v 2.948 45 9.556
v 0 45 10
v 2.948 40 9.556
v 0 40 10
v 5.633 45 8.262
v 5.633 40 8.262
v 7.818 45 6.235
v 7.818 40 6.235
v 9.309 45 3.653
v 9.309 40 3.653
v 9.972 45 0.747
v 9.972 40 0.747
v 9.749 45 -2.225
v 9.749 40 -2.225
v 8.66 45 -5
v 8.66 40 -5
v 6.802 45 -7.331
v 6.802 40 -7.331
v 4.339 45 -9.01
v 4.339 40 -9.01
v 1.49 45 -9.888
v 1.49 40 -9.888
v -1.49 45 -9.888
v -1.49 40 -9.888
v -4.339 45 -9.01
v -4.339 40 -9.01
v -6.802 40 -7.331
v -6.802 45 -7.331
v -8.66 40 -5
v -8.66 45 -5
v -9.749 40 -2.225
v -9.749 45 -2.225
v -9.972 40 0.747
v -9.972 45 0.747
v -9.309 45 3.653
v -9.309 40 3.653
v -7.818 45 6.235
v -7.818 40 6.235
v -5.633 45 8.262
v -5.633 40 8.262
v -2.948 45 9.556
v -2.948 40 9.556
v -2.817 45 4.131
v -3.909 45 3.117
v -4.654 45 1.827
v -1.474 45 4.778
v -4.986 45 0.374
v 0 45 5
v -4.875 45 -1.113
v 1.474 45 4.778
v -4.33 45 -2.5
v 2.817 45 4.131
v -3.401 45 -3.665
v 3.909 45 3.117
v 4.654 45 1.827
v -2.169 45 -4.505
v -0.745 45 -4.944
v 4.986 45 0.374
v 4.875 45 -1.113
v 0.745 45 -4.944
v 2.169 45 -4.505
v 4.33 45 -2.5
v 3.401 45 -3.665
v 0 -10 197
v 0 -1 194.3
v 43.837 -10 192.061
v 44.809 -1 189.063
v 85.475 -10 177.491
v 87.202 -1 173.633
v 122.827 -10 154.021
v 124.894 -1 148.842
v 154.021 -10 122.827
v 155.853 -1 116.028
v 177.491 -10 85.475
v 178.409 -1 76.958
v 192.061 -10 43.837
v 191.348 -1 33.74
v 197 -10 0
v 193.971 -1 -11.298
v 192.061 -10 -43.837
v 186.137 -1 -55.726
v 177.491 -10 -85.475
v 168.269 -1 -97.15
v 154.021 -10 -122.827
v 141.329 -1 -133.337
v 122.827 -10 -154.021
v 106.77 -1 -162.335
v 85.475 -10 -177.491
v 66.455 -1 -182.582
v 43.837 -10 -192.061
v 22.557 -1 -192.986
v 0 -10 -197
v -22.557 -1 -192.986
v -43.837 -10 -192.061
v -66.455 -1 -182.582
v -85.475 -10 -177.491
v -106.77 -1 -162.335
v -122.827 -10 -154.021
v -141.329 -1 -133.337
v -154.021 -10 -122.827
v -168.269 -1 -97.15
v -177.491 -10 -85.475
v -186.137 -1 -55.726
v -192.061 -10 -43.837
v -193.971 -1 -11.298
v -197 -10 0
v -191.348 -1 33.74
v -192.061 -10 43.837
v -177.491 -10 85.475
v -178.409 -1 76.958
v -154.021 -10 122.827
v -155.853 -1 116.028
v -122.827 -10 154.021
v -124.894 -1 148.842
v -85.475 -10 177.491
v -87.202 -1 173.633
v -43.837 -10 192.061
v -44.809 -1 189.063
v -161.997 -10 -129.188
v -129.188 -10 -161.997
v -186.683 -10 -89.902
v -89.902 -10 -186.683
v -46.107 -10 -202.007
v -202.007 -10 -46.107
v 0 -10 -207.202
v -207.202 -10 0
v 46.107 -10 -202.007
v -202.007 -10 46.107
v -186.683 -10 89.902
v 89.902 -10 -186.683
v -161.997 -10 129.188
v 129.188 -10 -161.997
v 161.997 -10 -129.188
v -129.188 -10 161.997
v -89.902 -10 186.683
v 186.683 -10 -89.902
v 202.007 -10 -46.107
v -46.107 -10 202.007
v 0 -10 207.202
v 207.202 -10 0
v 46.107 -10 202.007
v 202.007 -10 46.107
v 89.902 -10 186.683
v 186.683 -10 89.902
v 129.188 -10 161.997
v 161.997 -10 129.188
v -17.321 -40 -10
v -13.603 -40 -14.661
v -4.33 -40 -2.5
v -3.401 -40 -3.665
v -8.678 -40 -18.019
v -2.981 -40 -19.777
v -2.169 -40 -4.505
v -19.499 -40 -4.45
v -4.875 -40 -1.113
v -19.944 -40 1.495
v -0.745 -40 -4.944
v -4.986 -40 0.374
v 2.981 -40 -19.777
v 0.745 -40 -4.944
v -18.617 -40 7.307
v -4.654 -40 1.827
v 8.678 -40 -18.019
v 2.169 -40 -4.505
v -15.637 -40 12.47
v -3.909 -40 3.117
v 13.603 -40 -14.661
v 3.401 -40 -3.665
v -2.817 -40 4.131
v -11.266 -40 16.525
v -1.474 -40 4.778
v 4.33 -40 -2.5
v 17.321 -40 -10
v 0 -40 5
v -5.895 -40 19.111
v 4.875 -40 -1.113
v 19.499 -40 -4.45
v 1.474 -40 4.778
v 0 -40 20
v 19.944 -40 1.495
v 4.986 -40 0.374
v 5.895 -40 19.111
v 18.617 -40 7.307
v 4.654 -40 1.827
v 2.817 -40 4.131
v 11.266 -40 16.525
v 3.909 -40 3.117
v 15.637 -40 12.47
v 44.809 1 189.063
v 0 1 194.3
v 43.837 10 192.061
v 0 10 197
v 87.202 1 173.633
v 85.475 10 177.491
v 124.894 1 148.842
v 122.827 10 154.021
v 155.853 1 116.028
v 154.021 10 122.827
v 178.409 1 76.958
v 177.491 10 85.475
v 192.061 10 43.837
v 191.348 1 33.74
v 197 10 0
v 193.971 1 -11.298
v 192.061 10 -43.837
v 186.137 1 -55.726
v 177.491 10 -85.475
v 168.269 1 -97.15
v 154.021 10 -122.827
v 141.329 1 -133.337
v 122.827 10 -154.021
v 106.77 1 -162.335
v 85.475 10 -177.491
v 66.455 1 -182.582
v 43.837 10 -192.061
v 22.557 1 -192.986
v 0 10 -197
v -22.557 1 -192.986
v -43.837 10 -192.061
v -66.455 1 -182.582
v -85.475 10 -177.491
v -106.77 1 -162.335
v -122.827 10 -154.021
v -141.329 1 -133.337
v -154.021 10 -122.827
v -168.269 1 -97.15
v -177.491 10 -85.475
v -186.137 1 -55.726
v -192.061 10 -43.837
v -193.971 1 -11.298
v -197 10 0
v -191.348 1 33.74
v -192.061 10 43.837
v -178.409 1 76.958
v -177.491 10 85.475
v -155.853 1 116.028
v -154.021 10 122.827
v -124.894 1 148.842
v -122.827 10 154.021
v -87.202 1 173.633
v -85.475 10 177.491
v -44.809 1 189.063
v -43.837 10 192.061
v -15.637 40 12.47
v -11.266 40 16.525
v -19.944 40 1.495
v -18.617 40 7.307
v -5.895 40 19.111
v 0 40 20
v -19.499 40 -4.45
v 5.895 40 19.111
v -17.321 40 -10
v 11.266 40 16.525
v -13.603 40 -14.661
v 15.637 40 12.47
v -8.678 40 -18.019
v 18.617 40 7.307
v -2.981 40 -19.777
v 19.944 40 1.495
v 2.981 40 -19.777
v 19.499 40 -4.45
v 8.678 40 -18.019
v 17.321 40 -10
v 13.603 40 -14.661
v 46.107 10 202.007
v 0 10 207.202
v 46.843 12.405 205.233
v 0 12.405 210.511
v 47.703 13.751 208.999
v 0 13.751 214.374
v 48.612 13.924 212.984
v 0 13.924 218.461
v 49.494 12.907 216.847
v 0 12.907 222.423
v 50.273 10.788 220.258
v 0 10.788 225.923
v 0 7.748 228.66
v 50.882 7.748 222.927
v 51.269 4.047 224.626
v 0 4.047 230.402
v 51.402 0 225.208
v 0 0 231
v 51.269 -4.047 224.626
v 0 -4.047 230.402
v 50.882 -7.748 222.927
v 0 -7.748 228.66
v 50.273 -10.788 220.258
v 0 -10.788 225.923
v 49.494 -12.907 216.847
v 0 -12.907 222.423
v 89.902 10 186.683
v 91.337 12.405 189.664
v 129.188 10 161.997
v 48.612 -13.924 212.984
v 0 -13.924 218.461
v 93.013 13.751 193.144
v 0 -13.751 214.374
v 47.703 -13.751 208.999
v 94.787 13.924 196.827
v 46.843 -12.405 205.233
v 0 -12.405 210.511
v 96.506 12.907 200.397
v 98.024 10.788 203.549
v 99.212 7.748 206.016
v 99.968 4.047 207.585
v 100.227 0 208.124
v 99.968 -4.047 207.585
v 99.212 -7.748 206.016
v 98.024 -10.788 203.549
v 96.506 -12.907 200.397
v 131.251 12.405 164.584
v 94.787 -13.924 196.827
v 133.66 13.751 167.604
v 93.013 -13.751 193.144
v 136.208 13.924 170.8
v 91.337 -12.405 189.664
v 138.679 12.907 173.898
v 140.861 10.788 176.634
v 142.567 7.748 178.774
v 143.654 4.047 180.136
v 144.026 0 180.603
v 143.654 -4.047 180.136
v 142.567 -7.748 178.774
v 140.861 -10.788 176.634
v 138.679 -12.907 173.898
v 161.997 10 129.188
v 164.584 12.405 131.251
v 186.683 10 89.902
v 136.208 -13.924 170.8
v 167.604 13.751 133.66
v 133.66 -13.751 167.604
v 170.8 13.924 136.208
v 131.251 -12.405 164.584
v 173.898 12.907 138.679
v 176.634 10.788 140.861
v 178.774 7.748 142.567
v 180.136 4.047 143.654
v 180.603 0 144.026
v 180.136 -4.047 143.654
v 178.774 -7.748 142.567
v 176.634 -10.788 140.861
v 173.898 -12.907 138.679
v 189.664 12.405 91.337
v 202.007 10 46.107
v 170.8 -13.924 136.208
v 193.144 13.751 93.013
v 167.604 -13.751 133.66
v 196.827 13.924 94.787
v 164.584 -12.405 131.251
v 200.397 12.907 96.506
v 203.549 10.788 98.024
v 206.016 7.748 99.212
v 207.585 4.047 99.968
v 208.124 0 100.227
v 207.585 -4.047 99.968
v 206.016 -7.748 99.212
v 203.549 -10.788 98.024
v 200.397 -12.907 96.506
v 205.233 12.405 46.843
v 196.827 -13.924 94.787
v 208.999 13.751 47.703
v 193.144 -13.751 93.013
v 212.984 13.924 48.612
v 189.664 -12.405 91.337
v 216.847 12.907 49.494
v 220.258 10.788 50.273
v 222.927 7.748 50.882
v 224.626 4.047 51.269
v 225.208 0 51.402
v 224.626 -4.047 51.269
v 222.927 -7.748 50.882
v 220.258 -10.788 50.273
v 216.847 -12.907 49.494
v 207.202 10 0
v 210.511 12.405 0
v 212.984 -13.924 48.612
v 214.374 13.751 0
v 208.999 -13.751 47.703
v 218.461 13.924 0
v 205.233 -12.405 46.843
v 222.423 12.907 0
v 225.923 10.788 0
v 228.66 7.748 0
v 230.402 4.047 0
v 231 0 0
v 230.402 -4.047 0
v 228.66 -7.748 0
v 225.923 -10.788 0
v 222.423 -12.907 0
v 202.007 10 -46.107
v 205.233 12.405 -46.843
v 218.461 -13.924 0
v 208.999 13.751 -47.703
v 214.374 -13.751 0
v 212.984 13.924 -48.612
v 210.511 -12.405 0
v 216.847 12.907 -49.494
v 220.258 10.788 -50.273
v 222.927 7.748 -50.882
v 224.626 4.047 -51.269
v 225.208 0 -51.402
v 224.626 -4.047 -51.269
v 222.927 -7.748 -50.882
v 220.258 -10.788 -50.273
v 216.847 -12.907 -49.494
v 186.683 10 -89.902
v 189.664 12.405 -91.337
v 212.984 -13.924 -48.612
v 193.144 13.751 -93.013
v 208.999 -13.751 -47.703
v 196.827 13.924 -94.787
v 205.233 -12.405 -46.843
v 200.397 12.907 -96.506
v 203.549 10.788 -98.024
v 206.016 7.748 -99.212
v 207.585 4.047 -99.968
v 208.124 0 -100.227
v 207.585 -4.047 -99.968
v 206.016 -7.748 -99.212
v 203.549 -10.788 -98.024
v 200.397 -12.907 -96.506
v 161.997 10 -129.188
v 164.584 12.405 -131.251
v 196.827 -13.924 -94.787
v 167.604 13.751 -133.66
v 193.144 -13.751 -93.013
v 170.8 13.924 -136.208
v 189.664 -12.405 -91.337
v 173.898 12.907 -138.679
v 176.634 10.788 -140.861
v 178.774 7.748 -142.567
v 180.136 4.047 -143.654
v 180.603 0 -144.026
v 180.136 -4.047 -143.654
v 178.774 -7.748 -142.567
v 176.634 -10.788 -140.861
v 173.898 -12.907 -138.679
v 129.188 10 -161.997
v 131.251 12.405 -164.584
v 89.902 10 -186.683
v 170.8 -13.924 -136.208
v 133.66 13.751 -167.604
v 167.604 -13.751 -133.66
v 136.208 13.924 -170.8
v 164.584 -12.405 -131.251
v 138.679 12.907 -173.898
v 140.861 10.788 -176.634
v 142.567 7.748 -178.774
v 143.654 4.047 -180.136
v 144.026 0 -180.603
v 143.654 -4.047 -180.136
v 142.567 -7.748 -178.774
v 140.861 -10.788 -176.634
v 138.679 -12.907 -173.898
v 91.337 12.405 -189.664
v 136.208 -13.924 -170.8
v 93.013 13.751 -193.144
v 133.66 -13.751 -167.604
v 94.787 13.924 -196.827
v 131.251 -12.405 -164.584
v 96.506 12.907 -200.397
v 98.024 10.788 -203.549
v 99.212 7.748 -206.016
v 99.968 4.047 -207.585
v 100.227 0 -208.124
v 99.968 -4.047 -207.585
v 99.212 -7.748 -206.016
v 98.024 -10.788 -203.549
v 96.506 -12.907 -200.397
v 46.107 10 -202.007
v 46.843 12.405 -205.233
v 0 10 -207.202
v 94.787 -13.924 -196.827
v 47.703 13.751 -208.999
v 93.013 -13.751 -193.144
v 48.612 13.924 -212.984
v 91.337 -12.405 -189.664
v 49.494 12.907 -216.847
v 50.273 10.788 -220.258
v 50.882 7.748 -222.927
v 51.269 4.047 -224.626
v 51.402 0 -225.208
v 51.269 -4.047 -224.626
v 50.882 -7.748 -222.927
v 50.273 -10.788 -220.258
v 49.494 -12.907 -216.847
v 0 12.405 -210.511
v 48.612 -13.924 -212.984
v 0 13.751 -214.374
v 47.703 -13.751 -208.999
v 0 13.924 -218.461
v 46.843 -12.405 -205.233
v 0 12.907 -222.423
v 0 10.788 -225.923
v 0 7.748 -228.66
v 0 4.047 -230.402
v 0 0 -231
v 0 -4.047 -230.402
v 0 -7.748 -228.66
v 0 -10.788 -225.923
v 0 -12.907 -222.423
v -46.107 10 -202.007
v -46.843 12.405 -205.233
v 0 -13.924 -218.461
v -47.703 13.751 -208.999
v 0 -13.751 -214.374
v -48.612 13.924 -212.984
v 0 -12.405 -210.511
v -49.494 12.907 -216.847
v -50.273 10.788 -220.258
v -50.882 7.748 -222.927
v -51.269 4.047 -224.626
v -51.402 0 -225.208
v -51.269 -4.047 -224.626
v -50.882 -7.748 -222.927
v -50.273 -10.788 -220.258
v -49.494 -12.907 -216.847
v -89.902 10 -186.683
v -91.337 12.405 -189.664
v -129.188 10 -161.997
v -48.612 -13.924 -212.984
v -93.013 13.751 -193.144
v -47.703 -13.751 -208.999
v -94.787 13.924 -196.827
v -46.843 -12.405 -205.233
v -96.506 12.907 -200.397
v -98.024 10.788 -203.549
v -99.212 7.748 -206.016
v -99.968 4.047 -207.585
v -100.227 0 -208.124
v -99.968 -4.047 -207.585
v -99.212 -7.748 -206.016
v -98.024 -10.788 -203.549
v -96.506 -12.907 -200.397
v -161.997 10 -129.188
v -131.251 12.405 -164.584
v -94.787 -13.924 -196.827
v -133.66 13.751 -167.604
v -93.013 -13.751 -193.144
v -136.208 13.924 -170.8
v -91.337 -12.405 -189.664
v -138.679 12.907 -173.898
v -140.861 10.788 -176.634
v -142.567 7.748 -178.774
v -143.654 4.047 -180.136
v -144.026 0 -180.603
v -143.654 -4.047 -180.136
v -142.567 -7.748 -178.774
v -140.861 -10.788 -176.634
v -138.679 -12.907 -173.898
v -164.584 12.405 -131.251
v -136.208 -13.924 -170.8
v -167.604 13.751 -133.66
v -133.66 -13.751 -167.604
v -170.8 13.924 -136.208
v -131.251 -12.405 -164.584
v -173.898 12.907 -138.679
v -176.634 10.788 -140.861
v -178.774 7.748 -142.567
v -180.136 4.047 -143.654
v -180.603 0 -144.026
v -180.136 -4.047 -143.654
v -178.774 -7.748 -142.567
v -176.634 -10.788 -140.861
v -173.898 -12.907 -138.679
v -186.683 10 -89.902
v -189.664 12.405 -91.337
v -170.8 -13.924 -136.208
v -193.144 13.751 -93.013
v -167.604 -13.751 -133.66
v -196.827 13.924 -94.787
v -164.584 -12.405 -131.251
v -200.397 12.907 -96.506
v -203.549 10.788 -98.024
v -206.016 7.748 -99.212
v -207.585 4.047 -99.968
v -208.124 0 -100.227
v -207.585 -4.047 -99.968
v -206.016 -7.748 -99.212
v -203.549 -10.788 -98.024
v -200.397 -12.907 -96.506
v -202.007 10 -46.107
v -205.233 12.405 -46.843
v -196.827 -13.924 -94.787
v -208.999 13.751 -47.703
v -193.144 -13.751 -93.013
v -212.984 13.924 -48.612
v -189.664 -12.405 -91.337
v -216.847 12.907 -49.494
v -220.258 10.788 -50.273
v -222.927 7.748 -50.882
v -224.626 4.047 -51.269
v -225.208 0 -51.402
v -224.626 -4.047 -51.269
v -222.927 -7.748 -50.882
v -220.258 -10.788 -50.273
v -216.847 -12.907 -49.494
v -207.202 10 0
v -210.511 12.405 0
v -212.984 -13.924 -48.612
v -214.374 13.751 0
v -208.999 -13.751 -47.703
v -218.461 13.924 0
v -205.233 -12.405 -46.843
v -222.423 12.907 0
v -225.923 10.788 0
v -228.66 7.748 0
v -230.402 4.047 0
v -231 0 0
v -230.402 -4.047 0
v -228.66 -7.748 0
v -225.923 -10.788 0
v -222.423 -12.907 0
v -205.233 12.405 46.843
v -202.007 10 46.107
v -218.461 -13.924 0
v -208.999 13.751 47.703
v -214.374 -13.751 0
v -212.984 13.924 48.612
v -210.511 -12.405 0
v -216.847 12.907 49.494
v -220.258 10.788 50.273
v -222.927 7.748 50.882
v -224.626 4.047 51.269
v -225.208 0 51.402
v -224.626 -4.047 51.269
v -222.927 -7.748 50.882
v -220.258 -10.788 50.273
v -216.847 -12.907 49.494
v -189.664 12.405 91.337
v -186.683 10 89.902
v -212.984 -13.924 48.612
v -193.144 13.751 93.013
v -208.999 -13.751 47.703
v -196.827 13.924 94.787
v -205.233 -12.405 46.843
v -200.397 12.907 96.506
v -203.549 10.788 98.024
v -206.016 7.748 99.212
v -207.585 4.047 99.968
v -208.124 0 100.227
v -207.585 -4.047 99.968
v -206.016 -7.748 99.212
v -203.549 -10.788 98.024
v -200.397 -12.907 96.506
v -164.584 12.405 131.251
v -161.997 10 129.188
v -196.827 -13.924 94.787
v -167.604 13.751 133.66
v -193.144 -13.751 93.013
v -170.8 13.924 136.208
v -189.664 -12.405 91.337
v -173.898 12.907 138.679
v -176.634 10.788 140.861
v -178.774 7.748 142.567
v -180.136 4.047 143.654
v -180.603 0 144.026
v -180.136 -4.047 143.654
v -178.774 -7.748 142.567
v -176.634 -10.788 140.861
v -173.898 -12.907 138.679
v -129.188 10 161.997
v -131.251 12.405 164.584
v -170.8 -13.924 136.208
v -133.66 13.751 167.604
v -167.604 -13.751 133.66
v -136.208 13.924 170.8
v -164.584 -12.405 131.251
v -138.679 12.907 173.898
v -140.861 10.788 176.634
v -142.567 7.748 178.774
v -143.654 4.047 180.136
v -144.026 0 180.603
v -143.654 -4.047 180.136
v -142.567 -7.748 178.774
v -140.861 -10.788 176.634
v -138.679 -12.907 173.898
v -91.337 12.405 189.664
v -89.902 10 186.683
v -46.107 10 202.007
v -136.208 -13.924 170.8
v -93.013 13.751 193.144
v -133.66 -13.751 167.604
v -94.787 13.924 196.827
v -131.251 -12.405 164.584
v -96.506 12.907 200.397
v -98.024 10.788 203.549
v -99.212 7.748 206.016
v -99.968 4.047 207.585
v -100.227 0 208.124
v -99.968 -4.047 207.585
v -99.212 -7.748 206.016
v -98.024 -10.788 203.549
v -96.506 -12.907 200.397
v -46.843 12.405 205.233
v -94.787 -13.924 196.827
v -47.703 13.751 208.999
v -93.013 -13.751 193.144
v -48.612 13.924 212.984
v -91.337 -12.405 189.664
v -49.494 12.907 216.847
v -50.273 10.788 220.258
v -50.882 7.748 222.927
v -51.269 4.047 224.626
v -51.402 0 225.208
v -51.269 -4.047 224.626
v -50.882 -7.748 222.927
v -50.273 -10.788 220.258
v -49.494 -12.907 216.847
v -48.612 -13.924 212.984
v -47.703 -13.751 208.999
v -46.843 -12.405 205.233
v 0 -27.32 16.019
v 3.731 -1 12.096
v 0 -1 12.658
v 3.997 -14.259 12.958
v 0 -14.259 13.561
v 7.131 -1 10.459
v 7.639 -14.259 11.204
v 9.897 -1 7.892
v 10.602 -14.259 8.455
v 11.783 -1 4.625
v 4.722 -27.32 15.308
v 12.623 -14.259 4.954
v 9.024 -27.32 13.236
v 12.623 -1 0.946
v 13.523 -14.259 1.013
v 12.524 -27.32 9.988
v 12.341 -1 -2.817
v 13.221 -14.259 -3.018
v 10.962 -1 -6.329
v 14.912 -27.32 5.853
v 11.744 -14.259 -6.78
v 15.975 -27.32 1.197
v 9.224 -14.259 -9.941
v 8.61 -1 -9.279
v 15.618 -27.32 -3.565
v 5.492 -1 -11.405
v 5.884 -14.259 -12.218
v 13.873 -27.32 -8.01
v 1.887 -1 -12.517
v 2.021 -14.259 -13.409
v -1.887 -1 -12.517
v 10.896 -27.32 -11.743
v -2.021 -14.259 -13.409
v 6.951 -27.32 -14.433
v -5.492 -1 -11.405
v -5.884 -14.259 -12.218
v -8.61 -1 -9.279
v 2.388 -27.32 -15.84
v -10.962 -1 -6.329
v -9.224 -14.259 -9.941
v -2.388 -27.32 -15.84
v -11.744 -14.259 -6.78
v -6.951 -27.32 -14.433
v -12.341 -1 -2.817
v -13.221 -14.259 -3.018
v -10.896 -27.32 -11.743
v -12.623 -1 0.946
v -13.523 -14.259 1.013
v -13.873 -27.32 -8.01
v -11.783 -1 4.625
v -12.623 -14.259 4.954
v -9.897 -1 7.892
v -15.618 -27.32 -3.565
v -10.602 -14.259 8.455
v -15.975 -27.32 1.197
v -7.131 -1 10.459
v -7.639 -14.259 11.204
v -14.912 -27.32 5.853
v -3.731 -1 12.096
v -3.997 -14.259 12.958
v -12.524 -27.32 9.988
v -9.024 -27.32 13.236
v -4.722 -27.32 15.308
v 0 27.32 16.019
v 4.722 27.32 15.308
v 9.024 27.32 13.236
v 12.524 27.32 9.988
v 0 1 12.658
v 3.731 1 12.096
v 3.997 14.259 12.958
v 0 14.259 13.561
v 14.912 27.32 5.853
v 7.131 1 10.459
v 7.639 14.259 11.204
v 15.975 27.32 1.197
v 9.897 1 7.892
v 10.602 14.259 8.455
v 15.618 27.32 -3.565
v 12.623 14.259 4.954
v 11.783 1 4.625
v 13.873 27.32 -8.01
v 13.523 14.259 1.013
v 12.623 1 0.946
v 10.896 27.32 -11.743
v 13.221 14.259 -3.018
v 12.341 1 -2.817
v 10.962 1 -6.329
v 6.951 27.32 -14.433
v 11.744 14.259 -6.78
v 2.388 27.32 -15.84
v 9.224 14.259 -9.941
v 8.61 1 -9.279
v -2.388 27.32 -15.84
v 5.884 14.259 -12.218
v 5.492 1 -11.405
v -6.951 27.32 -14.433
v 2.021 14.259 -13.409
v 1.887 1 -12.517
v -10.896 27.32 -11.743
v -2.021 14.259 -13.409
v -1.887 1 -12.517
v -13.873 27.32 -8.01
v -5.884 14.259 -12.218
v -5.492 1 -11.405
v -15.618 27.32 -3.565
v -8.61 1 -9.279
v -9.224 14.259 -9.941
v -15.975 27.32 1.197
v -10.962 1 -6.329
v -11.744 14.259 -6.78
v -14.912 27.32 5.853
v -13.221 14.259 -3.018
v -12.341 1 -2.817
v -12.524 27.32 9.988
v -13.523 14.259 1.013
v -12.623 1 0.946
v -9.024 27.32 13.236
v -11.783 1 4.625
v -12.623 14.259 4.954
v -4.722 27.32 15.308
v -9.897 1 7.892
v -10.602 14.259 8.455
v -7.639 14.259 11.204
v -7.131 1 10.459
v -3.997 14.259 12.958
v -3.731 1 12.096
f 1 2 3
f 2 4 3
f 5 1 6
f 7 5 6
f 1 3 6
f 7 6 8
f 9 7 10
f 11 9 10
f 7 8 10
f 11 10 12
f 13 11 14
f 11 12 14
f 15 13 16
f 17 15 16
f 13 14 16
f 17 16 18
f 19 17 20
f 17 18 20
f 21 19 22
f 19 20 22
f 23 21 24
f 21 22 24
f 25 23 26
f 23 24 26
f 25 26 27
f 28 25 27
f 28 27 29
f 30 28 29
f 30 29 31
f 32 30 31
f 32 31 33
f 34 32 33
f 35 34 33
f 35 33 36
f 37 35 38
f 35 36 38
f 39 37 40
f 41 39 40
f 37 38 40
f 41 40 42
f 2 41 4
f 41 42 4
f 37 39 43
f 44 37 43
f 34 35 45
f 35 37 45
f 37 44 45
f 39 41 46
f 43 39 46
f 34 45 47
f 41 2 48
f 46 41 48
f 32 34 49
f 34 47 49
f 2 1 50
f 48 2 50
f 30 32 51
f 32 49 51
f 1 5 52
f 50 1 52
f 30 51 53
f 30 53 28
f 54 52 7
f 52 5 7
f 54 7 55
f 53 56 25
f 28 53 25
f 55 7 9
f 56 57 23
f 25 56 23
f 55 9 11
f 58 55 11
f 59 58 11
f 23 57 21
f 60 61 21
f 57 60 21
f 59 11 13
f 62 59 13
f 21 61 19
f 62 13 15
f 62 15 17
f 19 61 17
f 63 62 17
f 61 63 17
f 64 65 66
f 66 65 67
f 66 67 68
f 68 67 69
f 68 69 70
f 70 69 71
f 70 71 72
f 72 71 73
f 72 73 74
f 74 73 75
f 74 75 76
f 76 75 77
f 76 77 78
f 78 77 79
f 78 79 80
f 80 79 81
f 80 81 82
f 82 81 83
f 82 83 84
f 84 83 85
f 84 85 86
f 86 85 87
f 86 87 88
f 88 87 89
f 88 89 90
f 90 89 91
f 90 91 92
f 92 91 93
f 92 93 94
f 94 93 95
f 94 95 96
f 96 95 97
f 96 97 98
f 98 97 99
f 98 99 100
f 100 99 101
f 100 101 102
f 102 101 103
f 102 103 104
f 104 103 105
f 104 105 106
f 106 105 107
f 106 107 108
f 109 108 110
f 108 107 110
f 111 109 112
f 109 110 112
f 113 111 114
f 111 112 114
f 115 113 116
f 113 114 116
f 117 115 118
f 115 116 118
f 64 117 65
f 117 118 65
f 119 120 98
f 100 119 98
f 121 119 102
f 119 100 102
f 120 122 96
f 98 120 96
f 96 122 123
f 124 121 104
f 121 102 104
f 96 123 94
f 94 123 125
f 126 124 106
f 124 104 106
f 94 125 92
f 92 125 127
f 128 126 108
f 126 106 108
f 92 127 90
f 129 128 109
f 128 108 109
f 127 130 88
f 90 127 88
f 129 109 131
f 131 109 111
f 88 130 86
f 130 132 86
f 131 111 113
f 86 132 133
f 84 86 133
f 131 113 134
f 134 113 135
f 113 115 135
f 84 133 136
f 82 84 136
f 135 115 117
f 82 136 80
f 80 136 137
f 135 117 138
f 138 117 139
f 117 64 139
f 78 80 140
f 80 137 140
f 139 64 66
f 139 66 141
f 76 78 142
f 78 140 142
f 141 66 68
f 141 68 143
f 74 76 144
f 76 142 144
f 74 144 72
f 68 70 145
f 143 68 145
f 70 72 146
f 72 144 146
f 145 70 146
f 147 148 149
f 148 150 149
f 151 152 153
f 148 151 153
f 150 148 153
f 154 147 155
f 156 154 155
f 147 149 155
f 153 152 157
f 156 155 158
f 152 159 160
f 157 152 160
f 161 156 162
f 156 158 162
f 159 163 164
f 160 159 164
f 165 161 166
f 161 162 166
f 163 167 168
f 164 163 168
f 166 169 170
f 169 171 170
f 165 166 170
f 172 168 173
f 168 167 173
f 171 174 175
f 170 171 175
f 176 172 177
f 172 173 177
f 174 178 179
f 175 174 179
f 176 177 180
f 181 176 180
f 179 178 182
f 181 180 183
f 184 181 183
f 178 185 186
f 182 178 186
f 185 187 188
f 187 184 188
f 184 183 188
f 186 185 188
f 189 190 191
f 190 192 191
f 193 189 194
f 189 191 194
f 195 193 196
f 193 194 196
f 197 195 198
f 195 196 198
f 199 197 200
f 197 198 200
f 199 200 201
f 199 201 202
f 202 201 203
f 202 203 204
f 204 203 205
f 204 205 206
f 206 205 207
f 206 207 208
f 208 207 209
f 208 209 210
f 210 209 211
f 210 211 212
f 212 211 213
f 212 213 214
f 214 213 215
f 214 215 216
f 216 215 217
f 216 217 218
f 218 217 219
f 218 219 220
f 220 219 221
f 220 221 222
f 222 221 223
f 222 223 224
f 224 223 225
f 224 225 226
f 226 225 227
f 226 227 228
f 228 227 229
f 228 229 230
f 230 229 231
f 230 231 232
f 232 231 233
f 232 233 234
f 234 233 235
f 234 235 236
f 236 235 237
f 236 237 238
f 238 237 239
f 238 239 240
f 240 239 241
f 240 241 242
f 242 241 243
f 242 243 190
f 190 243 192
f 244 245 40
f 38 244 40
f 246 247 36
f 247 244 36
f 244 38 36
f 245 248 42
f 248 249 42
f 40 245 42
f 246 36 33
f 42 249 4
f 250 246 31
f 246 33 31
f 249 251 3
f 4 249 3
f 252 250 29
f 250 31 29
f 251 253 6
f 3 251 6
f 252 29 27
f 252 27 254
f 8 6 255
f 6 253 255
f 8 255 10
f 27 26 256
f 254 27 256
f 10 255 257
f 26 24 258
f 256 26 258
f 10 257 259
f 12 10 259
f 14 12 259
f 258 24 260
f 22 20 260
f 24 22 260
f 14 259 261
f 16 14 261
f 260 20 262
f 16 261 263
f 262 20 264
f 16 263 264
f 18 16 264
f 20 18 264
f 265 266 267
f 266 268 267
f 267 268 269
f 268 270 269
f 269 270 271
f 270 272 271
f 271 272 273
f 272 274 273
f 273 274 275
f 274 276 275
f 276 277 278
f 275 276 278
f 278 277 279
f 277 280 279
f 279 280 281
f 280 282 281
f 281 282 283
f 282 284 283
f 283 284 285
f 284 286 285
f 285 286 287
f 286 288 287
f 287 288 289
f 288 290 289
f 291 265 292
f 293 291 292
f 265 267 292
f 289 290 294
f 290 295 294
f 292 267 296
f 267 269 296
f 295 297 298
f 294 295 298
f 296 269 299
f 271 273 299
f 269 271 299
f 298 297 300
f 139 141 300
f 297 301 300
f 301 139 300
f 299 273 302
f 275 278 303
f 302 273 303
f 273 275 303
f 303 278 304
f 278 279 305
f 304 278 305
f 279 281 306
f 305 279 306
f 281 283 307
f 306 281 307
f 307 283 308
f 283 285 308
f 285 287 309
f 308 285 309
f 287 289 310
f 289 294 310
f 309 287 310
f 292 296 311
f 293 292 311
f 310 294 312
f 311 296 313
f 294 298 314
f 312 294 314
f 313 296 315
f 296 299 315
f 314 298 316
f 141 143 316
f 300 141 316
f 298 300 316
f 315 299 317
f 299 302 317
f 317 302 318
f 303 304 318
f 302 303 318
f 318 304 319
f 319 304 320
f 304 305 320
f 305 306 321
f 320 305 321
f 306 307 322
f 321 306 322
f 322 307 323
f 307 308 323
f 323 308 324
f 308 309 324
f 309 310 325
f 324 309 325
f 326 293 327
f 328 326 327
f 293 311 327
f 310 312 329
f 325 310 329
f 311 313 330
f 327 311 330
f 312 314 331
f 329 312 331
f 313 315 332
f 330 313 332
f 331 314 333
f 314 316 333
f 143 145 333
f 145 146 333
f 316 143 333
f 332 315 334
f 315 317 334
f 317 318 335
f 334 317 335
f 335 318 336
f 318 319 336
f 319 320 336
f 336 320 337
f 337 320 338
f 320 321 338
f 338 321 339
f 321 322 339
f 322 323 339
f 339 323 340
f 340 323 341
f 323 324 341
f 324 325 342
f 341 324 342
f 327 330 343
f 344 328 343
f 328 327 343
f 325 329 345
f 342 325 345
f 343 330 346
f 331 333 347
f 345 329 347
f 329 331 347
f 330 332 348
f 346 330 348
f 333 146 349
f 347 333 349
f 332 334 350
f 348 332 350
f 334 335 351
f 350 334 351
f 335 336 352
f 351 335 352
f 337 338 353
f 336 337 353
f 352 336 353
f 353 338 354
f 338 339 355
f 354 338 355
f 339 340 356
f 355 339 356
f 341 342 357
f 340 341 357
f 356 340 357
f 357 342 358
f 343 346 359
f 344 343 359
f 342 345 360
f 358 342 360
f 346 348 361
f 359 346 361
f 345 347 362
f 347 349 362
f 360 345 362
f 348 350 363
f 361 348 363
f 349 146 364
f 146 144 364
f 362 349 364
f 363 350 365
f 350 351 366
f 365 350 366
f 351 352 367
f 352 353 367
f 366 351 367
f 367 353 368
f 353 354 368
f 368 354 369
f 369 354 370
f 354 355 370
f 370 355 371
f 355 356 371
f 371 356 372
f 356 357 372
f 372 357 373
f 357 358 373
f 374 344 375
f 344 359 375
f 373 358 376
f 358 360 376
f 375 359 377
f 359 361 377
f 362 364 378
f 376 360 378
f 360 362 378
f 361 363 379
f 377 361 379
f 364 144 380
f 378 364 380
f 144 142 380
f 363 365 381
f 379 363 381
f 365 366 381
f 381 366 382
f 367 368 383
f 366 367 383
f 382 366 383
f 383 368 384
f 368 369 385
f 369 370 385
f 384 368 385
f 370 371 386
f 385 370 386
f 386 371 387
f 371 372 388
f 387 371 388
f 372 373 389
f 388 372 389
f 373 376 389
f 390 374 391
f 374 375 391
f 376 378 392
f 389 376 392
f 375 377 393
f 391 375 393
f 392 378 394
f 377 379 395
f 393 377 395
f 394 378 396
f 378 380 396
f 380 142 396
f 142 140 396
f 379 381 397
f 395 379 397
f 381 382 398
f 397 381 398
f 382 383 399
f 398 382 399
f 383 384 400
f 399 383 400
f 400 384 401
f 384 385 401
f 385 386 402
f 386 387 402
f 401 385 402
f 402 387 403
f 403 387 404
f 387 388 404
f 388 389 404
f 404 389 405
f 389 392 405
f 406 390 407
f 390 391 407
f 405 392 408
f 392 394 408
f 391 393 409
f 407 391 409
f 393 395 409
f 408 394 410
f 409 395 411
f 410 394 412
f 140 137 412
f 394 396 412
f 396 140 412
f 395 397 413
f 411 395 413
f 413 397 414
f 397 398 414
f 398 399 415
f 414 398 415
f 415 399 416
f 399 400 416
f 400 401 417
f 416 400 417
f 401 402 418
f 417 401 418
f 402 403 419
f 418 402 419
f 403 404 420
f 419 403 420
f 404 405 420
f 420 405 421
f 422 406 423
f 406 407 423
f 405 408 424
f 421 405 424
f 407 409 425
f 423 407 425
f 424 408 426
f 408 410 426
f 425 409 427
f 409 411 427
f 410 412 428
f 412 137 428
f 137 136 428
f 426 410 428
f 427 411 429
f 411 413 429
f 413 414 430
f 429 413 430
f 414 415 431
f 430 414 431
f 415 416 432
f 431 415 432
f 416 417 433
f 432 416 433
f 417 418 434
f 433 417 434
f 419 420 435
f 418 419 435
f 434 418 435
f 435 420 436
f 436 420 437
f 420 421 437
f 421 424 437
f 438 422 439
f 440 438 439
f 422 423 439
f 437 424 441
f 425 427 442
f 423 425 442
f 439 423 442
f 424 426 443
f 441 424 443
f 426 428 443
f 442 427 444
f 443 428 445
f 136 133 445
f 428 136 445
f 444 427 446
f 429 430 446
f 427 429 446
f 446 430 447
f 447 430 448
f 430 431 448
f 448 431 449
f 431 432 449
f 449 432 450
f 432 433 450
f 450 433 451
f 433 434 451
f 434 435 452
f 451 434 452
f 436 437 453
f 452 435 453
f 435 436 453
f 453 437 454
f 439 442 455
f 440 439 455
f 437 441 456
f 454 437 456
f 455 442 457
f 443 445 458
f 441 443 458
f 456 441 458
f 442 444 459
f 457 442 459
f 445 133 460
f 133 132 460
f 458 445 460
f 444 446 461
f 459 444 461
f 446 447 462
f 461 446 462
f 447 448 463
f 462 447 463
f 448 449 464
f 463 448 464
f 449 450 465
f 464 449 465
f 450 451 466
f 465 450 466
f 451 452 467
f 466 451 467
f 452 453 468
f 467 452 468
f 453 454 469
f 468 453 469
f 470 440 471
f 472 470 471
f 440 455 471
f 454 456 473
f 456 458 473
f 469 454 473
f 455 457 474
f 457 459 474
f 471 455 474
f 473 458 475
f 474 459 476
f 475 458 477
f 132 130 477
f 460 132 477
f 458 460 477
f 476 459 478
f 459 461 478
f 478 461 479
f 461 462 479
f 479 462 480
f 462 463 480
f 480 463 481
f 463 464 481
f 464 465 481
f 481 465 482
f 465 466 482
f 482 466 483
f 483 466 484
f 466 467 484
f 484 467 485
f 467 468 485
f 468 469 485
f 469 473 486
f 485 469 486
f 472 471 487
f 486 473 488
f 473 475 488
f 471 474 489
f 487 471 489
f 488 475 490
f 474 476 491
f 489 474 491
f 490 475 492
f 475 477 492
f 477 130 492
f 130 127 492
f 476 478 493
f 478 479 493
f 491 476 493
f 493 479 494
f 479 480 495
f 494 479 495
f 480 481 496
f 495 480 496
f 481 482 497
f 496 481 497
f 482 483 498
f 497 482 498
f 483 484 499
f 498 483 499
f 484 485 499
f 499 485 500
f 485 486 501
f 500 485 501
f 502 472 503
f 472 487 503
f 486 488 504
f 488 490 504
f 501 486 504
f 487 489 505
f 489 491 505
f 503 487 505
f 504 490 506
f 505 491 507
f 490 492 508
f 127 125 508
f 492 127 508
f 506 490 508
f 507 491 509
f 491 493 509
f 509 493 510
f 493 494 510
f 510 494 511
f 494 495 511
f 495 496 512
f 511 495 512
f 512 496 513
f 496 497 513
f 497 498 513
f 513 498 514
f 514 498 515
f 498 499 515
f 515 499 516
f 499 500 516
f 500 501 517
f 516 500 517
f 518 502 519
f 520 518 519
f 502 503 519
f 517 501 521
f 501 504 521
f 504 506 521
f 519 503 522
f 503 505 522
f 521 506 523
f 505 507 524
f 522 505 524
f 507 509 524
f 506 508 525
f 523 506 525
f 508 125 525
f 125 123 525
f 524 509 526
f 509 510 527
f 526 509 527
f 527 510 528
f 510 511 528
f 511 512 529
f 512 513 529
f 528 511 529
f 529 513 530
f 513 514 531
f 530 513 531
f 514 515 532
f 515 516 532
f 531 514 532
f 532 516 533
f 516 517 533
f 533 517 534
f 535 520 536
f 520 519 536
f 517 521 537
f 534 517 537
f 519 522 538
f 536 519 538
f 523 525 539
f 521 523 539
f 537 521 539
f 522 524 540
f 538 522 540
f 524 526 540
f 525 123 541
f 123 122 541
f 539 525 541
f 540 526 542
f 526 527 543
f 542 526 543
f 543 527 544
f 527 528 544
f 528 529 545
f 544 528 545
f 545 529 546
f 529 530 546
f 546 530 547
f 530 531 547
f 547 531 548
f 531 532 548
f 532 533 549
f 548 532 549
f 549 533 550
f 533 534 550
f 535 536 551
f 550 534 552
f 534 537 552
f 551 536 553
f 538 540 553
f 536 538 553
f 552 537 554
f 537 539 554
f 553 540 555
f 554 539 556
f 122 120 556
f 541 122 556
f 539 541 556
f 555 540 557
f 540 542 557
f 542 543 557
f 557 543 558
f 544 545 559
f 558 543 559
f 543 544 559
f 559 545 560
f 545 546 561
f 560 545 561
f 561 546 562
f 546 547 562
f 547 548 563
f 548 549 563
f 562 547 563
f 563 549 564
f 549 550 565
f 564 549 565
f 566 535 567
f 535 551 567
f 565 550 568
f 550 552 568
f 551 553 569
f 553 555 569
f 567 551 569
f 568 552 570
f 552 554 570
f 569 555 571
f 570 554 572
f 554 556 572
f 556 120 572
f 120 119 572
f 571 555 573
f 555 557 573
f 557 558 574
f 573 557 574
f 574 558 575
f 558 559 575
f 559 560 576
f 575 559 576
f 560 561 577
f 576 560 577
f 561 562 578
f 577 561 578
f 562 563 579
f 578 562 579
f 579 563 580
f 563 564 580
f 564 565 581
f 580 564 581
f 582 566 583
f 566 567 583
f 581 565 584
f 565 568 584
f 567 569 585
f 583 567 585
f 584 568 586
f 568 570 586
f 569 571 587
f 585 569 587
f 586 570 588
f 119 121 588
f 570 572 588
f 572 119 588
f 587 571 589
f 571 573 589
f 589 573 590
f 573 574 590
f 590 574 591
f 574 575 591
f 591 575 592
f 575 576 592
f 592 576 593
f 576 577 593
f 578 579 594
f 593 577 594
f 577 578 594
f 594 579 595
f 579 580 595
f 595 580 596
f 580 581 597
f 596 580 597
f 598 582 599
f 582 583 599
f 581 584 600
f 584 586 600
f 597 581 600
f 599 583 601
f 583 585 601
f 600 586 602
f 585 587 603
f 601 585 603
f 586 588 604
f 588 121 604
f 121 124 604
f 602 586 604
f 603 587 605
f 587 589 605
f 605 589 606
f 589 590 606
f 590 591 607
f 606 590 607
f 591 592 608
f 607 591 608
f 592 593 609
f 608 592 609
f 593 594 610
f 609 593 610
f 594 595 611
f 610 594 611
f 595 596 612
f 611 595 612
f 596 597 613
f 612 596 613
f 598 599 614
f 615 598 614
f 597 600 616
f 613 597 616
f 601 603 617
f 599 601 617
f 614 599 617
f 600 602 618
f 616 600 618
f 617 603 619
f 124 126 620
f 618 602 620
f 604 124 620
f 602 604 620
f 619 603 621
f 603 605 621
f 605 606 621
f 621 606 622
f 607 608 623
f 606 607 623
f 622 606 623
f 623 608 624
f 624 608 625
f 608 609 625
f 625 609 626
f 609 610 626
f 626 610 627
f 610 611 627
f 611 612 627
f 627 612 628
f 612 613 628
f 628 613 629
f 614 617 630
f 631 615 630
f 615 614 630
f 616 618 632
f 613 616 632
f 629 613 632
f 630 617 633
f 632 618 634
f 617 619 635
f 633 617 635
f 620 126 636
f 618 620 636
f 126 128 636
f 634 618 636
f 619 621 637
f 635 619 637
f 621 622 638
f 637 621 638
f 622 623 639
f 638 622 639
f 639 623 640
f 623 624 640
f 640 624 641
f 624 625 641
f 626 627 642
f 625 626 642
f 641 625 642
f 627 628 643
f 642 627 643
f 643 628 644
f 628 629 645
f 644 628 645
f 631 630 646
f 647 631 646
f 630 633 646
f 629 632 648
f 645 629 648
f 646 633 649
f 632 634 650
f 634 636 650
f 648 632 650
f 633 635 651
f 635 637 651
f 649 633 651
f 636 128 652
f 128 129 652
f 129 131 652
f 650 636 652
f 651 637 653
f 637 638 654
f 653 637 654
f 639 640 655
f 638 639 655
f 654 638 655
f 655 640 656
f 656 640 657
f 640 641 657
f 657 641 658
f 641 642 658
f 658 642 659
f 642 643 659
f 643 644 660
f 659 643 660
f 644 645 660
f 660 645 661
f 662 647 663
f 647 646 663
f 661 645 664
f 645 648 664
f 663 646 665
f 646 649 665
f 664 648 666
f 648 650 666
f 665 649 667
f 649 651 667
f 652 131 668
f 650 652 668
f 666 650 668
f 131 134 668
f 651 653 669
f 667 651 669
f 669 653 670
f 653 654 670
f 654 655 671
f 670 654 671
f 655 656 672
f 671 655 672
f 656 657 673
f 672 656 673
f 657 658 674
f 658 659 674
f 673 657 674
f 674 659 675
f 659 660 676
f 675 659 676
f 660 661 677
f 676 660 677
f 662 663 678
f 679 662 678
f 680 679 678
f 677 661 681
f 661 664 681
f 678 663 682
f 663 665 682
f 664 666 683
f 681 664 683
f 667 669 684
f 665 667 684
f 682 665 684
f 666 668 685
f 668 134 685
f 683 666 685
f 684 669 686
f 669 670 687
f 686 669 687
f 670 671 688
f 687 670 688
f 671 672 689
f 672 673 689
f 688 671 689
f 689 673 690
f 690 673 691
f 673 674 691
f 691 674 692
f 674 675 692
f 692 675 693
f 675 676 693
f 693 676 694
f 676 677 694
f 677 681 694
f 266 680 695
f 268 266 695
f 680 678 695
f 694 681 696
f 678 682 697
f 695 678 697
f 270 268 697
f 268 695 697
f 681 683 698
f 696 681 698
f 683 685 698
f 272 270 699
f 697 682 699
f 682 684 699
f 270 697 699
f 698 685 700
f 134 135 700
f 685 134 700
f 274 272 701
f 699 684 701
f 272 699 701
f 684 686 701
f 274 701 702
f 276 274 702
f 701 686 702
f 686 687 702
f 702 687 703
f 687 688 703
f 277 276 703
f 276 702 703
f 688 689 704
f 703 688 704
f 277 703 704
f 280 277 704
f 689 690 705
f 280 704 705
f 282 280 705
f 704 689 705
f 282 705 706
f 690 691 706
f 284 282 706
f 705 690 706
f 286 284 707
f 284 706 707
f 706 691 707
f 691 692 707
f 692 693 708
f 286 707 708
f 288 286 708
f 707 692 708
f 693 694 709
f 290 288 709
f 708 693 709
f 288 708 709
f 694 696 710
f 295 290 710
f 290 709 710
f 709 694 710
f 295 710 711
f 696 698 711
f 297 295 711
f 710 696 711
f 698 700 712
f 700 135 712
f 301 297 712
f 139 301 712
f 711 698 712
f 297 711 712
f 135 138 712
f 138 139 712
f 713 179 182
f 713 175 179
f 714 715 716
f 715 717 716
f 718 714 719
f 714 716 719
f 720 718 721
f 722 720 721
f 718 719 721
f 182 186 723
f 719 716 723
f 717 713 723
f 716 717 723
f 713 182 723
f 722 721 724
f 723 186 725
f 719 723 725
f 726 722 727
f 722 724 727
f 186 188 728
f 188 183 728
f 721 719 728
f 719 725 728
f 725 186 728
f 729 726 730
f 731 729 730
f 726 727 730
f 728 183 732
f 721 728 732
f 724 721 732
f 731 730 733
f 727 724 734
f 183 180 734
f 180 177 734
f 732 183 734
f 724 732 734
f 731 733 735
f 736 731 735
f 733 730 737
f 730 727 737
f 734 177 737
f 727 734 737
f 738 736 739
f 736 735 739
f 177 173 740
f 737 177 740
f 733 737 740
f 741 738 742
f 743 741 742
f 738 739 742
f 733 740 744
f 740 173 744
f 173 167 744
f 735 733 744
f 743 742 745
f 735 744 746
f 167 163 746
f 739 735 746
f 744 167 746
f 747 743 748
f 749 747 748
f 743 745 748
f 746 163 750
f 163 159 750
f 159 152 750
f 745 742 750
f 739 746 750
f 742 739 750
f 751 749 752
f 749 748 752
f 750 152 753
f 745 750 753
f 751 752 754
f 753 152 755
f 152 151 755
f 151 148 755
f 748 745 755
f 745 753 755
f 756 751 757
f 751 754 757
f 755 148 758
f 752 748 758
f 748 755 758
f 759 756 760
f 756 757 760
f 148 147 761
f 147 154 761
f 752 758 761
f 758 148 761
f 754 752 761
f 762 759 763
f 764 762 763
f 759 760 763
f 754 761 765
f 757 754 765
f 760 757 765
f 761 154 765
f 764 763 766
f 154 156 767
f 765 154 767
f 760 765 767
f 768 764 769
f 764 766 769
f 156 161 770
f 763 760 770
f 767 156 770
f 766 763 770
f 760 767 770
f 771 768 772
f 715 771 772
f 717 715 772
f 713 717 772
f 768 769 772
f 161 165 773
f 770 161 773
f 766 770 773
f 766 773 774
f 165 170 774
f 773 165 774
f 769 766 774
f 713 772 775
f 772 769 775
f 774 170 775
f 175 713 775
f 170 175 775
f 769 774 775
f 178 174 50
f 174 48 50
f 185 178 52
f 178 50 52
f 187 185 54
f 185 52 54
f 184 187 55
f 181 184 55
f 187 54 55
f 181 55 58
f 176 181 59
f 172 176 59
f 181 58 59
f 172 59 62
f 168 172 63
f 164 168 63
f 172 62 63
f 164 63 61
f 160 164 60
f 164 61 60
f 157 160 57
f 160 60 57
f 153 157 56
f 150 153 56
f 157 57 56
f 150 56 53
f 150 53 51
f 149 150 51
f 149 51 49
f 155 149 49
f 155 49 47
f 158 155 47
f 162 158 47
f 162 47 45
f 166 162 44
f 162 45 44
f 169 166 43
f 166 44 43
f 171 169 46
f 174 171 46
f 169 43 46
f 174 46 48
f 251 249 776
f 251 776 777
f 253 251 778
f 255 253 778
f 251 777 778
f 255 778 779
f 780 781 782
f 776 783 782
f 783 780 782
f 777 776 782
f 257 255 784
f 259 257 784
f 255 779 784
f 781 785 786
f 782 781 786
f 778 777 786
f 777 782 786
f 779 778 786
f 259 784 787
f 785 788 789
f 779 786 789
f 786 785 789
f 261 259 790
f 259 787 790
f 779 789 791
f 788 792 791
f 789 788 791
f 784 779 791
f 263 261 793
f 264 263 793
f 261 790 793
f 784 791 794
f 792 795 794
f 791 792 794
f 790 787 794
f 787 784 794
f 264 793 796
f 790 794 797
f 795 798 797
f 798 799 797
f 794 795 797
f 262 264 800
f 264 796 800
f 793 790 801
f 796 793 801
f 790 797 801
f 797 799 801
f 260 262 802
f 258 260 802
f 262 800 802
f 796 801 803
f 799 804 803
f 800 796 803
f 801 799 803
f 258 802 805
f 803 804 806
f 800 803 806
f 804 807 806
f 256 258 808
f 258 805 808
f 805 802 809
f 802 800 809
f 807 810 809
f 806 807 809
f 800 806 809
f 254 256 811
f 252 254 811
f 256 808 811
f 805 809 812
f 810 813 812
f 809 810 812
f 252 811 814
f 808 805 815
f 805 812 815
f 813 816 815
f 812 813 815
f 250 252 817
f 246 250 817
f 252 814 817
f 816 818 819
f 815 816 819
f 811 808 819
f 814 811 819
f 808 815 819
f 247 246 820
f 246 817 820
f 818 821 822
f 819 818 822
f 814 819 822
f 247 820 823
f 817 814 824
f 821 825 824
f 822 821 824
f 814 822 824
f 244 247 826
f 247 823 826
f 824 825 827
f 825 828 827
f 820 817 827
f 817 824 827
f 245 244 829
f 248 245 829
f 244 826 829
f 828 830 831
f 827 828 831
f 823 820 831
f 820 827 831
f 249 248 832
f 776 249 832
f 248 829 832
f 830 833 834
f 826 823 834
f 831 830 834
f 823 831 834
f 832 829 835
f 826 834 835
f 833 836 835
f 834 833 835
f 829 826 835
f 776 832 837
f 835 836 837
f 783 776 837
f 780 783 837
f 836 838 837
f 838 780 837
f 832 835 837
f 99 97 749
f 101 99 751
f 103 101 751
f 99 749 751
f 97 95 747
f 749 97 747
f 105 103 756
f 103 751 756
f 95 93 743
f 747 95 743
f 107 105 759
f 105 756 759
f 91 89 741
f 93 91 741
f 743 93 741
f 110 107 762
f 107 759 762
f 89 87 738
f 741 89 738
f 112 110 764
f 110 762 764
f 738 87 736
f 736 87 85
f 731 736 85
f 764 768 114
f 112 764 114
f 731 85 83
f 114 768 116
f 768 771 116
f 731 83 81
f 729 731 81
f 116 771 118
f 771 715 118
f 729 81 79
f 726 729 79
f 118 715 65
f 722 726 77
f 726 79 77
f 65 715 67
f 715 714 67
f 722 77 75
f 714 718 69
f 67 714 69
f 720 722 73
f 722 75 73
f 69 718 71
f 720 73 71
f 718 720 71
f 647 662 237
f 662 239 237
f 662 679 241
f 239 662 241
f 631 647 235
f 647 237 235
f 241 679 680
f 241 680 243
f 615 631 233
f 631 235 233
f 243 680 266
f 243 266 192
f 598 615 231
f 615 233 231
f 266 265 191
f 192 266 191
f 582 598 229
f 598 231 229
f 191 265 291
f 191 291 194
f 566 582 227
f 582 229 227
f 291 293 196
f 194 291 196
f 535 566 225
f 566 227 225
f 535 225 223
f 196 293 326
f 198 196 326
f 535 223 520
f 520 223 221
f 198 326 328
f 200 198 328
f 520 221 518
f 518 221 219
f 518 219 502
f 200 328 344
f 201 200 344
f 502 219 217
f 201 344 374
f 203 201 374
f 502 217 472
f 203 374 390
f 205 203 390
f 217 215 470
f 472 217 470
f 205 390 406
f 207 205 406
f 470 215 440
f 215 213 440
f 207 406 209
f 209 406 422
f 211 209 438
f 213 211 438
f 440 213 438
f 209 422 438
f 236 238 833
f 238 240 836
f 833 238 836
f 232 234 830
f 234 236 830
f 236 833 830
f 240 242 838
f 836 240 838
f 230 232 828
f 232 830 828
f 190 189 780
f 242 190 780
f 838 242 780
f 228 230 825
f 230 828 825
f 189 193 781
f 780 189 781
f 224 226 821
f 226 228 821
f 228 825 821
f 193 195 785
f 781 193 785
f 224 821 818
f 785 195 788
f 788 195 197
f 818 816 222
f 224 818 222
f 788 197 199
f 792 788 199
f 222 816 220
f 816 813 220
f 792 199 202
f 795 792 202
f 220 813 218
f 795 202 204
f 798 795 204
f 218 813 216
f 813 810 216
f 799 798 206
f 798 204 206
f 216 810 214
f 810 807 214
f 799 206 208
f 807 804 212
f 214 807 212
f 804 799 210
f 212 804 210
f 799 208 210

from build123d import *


with BuildPart() as f1:
    # F0 (on Right) → F1 (revolve)
    with BuildSketch(Plane.YZ):
        with BuildLine():
            Line((10, 197), (10, 207.202041))
            ThreePointArc((10, 207.202041), (0, 231), (-10, 207.202041))
            Line((-10, 207.202041), (-10, 197))
            Line((-10, 197), (-1, 194.3))
            Line((-1, 194.3), (-1, 12.658382))
            ThreePointArc((-1, 12.658382), (-20.826062, 14.597093), (-40, 20))
            Line((-40, 20), (-40, 5))
            Line((-40, 5), (40, 5))
            Line((40, 5), (45, 5))
            Line((45, 5), (45, 10))
            Line((45, 10), (40, 10))
            Line((40, 10), (40, 20))
            ThreePointArc((40, 20), (20.826062, 14.597093), (1, 12.658382))
            Line((1, 12.658382), (1, 194.3))
            Line((1, 194.3), (10, 197))
        make_face()
    revolve(axis=Axis((0, 1.765828, 0), (0, 1, 0)))


solid = f1.part
